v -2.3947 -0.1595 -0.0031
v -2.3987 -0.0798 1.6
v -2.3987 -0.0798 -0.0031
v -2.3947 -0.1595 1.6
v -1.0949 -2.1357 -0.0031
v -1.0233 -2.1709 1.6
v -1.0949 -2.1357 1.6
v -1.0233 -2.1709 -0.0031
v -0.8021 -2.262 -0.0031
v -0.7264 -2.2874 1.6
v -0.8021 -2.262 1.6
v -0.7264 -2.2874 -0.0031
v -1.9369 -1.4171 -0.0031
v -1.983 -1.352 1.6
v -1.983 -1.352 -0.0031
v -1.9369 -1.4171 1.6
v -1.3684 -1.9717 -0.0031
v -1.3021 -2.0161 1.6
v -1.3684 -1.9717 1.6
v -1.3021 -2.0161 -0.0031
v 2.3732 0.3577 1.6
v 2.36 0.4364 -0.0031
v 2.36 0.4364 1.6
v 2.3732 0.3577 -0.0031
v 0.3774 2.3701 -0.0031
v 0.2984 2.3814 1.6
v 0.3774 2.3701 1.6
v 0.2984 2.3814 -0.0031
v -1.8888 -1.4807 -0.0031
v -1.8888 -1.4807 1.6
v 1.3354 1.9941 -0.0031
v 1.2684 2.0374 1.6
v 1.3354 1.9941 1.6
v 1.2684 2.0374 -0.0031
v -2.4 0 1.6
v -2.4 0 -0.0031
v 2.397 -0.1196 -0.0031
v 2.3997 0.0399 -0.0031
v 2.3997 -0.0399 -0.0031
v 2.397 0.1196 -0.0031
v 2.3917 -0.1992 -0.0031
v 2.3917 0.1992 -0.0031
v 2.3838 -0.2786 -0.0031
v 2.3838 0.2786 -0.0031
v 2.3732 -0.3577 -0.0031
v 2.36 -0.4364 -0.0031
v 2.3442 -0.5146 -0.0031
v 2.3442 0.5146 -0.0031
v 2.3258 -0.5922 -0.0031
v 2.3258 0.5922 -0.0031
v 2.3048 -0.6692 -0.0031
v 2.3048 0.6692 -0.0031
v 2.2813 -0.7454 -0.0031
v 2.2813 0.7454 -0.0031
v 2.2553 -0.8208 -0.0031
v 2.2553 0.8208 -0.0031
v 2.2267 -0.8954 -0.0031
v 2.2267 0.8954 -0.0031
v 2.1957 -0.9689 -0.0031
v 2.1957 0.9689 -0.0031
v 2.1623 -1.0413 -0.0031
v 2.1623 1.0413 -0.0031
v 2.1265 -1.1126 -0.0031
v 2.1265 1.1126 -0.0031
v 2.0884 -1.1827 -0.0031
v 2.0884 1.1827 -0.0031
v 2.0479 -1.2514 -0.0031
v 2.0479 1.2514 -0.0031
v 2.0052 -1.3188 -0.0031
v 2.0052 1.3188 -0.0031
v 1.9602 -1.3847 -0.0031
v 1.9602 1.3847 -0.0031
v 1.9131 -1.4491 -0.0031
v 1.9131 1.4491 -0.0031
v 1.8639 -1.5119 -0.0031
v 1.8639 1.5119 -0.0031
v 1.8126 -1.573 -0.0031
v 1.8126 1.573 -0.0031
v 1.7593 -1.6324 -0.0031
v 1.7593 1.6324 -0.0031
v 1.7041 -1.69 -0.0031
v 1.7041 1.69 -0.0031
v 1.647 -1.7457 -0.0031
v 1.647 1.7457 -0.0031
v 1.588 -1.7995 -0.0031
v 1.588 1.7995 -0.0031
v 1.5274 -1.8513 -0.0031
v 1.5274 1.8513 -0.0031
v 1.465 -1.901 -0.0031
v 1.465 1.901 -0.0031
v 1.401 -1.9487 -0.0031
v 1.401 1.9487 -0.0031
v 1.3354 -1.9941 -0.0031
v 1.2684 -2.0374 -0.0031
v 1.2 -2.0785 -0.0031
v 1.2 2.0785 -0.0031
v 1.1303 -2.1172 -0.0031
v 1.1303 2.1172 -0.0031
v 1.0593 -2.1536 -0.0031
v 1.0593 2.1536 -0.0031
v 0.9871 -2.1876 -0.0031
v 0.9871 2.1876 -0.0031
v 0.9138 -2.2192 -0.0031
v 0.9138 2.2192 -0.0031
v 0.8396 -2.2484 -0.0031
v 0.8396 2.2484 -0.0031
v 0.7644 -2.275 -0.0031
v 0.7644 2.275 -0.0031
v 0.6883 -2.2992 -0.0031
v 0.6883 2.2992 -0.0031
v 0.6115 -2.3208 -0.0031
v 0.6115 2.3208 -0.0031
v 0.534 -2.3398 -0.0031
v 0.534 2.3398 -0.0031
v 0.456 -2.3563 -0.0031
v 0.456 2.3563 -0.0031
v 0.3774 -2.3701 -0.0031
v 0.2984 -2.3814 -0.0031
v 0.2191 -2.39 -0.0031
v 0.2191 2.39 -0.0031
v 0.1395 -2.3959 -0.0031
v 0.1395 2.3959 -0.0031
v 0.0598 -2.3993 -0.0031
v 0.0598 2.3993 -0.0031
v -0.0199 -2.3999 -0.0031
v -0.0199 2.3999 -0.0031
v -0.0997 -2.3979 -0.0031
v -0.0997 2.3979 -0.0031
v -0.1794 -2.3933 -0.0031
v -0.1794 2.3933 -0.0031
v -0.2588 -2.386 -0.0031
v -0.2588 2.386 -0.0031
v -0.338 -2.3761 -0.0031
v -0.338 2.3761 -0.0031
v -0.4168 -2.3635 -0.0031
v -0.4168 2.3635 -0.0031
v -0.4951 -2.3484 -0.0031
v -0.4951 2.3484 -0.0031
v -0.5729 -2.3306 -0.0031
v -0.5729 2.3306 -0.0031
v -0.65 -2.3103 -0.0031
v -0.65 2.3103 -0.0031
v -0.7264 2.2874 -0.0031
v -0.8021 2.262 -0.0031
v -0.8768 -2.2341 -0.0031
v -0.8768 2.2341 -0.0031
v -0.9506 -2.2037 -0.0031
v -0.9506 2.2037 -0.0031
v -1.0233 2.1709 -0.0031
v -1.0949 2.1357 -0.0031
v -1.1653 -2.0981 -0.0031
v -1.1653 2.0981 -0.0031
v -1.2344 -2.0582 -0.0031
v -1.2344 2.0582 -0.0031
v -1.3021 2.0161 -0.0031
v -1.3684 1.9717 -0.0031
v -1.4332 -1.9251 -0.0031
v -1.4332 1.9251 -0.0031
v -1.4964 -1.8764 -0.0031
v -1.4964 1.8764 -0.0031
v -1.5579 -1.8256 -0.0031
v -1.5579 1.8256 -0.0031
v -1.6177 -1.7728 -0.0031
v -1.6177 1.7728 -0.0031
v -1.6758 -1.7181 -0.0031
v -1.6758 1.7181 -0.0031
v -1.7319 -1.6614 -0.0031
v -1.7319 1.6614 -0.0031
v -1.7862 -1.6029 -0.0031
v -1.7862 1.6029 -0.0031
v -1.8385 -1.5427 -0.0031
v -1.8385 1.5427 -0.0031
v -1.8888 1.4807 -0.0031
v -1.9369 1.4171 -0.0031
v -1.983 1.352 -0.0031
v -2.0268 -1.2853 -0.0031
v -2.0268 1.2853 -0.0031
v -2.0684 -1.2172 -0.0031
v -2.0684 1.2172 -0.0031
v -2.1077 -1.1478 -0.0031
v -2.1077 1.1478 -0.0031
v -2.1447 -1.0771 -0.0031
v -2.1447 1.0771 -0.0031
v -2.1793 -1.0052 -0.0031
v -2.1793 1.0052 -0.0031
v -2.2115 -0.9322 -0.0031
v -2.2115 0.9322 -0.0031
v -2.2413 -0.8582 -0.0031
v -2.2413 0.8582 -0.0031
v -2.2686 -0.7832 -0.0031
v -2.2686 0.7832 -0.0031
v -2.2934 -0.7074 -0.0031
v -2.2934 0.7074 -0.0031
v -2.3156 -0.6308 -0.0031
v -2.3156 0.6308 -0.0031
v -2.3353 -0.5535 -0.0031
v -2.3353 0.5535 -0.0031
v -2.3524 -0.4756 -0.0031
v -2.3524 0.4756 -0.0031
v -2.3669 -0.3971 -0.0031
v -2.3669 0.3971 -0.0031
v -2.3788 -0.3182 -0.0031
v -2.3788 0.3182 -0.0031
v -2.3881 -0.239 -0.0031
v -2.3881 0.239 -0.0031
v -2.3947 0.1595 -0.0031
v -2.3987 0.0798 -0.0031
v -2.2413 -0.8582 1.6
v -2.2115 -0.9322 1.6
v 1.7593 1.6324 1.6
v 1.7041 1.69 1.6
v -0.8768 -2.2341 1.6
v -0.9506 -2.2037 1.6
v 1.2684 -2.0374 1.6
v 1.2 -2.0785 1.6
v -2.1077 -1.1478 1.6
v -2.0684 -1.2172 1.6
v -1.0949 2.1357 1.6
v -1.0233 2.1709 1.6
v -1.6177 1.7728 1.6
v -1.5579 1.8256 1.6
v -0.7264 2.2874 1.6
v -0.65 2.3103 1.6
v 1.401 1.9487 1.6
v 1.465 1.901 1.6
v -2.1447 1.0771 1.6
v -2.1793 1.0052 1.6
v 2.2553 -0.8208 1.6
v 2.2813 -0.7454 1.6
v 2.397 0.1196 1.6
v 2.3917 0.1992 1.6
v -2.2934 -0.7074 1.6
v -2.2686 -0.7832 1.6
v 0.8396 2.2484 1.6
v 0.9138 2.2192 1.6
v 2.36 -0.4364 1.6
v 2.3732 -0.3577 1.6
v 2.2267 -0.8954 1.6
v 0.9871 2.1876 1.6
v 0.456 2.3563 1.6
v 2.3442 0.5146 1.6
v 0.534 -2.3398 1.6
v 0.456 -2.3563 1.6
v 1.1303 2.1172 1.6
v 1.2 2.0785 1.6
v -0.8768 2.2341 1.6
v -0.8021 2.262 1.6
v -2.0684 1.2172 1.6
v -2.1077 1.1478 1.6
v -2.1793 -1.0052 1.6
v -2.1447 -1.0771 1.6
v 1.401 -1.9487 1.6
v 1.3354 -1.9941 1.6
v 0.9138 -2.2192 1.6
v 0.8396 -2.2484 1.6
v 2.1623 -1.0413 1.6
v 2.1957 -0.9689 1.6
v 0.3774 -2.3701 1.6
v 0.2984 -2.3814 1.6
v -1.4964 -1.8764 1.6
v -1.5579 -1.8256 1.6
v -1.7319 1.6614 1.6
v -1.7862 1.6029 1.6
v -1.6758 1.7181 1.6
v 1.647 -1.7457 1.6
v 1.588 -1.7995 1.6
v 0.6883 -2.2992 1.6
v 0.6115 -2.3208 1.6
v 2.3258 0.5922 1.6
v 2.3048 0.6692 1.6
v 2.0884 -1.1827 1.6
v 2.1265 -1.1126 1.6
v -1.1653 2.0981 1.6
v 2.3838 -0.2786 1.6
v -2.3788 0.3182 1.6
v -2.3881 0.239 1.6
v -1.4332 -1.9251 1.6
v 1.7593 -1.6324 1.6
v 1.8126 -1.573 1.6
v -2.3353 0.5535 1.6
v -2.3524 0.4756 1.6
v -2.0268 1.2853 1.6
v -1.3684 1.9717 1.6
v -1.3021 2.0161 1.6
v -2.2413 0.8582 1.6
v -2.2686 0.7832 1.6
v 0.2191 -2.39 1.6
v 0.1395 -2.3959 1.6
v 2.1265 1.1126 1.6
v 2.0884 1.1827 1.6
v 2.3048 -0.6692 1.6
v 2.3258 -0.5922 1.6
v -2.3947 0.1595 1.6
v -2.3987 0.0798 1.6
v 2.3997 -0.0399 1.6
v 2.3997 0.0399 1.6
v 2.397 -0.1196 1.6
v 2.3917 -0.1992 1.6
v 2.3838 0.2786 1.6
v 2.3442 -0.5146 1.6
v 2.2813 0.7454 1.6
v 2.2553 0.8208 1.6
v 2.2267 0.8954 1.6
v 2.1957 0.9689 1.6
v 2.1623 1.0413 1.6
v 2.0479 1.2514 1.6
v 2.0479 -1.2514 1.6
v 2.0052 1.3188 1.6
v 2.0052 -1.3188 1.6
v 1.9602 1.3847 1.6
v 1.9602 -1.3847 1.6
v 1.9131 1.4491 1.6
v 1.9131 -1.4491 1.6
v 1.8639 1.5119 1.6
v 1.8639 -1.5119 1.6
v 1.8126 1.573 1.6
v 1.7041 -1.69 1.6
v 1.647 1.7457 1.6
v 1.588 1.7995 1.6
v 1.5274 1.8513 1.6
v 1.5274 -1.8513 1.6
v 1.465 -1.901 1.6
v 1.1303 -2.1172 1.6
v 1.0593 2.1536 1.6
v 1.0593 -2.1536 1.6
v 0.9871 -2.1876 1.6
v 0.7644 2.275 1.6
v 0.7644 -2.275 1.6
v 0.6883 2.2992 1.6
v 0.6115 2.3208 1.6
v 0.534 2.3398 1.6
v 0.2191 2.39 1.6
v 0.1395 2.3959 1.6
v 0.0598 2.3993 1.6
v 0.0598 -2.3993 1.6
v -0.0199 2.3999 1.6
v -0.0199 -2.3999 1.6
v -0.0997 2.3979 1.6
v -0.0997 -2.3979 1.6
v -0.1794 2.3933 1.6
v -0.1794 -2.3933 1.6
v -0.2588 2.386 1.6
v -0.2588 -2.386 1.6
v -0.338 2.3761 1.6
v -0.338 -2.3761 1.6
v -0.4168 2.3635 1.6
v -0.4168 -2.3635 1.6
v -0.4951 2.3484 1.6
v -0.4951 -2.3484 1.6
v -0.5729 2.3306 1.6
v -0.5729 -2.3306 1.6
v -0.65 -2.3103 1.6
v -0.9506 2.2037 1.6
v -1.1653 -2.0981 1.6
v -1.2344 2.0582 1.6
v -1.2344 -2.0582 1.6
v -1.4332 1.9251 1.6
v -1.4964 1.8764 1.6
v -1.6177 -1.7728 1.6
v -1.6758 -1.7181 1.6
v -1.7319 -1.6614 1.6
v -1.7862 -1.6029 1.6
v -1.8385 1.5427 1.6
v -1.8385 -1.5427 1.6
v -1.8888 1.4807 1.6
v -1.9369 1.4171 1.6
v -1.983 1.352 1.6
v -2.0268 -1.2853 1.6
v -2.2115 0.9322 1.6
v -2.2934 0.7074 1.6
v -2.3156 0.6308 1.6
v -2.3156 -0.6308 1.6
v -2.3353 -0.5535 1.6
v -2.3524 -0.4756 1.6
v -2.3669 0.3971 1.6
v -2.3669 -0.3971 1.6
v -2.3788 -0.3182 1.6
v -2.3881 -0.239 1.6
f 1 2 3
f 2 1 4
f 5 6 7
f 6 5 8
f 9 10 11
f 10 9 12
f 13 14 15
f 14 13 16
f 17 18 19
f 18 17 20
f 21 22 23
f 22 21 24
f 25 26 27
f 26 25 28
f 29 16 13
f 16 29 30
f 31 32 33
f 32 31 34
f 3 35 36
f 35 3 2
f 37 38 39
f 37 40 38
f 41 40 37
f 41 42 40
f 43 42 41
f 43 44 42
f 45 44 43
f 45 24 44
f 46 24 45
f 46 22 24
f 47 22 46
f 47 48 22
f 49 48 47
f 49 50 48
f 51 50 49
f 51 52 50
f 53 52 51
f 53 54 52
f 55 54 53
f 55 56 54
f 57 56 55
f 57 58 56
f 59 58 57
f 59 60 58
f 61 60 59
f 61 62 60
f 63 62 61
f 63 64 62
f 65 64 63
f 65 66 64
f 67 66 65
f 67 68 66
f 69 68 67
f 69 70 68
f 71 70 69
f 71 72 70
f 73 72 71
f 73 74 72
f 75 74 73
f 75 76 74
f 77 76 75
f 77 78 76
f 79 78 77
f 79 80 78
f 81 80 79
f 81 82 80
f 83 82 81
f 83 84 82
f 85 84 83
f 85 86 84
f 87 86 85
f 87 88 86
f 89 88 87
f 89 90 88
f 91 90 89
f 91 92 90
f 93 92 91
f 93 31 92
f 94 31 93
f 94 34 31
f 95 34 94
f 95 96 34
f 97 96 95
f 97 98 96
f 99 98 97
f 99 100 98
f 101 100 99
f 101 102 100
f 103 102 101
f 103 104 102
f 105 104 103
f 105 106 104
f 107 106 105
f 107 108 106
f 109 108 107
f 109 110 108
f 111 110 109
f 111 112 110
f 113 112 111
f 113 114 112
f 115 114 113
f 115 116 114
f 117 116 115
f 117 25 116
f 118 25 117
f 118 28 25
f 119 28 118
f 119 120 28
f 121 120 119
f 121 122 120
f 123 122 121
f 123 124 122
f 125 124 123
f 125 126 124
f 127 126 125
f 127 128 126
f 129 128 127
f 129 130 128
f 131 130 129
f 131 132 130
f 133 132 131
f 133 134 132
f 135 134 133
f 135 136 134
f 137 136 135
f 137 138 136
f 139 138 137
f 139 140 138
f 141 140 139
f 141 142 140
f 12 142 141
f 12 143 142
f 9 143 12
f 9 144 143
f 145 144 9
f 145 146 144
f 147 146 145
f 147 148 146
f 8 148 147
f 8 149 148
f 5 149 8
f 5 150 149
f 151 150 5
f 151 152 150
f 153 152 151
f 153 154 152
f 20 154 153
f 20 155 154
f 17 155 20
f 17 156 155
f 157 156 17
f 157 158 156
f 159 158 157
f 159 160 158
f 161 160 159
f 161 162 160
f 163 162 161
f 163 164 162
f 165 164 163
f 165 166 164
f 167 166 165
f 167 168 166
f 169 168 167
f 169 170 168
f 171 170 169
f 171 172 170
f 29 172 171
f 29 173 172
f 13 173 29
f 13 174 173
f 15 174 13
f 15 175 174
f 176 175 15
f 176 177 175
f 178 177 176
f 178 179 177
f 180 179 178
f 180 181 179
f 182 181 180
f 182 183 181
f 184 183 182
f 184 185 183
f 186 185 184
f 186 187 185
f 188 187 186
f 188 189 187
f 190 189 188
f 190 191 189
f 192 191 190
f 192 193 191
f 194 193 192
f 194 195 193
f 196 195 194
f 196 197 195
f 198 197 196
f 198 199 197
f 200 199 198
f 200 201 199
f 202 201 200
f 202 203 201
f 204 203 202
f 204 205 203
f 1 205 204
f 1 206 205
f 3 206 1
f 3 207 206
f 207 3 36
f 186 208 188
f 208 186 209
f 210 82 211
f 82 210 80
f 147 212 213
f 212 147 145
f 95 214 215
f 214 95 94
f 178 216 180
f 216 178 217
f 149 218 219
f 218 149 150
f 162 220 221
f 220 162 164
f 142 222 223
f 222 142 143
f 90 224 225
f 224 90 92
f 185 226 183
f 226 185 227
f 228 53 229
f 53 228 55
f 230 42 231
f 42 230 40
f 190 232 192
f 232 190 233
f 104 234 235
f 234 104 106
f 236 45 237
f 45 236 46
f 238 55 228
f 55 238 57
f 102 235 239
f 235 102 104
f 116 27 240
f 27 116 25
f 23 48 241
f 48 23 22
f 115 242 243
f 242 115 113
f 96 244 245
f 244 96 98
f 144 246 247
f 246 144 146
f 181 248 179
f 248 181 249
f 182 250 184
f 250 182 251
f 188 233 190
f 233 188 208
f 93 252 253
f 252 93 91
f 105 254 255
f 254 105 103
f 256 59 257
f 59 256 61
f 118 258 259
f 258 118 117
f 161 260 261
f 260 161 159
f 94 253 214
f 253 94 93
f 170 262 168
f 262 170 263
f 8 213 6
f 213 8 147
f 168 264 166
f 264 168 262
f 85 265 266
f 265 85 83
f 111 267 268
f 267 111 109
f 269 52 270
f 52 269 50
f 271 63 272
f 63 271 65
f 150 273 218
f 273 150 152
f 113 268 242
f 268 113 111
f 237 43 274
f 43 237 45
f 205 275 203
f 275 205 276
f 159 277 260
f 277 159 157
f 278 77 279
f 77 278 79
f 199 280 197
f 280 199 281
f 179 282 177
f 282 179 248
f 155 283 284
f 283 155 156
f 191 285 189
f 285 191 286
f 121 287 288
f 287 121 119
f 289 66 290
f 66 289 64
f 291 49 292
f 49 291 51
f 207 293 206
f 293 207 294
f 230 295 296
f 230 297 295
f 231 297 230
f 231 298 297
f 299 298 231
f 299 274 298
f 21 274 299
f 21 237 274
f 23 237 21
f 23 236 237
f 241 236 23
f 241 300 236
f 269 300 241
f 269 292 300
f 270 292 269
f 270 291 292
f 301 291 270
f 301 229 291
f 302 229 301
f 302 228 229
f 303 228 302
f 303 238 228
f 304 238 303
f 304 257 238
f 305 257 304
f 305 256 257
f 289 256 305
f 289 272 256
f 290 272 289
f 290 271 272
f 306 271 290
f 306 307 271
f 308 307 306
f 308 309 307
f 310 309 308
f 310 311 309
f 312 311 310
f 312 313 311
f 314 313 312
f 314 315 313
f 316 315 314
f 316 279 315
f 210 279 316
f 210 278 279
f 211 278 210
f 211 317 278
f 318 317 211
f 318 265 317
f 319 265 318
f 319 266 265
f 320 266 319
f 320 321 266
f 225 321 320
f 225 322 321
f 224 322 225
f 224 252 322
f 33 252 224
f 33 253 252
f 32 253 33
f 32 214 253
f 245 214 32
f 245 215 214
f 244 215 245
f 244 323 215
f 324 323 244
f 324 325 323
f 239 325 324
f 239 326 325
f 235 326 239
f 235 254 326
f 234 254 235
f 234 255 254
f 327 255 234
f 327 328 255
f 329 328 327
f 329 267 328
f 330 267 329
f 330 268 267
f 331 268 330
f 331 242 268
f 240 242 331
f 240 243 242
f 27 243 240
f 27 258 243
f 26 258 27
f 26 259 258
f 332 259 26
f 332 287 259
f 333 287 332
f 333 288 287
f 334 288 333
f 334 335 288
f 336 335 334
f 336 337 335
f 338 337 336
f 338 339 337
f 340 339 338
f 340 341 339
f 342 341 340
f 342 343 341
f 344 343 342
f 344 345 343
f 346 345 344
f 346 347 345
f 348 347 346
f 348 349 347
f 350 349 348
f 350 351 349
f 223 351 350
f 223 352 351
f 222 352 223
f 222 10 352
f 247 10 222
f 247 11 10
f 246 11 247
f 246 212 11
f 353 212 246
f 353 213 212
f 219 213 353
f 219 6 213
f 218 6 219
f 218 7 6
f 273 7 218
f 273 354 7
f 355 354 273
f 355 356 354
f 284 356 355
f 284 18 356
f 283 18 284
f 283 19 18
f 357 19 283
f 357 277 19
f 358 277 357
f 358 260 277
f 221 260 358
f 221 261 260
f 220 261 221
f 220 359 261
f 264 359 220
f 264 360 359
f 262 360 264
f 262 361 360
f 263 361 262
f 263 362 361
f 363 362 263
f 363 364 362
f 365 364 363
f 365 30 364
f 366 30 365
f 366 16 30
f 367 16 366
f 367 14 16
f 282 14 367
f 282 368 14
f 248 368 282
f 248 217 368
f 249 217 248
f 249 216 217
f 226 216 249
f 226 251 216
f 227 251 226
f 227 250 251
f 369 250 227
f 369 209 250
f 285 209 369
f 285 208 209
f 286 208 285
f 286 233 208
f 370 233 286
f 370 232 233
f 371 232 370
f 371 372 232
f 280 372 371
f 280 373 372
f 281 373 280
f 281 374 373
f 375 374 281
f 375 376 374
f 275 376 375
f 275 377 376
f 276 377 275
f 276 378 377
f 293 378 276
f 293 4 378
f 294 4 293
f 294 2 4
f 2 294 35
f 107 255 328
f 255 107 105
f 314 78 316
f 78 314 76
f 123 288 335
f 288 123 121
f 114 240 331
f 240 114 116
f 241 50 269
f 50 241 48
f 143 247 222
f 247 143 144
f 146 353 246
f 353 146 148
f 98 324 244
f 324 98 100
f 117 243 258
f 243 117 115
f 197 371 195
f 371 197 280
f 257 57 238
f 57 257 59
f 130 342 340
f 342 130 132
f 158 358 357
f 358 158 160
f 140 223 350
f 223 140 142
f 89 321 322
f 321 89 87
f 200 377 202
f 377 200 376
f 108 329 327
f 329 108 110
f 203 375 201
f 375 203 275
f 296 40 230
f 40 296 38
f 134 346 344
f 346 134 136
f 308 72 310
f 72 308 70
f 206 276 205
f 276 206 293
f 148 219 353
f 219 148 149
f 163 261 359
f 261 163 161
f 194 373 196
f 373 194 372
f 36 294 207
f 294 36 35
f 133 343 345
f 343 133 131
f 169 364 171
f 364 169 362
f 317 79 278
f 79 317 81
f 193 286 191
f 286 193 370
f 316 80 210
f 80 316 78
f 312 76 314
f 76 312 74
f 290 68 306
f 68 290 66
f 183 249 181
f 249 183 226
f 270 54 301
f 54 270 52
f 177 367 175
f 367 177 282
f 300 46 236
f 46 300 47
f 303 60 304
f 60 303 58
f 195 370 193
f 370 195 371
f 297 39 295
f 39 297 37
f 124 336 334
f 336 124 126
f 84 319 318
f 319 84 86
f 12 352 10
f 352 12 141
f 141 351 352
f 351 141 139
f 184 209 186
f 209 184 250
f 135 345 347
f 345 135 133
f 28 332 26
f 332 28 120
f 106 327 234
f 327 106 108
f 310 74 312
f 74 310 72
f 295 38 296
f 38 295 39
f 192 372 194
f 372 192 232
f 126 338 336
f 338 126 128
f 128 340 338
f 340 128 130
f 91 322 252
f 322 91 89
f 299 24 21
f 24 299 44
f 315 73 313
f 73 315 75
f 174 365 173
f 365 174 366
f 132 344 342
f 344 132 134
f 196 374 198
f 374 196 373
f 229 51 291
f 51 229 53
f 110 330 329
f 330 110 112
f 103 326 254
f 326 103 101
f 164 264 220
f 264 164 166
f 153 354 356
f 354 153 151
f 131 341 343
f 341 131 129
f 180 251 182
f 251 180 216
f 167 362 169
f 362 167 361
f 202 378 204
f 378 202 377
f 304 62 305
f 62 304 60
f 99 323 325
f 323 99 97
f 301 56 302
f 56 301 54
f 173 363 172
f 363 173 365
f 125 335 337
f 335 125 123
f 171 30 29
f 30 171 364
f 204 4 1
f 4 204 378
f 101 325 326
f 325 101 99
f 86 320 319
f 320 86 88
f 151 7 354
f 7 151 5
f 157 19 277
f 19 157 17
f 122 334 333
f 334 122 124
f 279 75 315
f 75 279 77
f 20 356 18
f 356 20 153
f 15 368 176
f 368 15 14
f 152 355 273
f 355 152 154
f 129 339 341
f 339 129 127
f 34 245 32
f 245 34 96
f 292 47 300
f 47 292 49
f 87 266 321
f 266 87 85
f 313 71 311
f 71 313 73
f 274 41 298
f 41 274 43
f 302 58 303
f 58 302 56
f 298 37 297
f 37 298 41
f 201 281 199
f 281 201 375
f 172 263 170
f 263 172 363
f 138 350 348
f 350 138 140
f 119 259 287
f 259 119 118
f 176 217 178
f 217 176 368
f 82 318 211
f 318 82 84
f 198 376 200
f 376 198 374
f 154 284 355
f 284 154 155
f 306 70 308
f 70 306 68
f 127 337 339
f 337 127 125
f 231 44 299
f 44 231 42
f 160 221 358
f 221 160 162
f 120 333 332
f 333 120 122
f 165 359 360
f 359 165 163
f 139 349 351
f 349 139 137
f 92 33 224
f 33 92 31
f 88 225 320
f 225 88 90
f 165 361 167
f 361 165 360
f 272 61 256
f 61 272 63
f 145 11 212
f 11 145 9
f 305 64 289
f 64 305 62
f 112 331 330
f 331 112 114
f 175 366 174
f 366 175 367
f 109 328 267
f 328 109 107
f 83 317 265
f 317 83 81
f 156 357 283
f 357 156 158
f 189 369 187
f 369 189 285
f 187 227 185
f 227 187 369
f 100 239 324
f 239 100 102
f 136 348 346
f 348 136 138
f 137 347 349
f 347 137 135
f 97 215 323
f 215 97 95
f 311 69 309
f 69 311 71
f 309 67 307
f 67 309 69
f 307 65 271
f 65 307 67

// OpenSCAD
use <../lib.scad>
use <3005pv6.scad>
$fa=1; $fs=0.2;
function ldraw_lib__3005_6b(realsolid=false) = [
// 0 ~Moved to 3005pv6
// 0 Name: 3005-6b.dat
// 0 Author: [PTadmin]
// 0 !LDRAW_ORG Part UPDATE 2004-02
// 0 !LICENSE Licensed under CC BY 4.0 : see CAreadme.txt
// 
// 0 BFC CERTIFY CCW
  [0,"BFC","CERTIFY"],
  [0,"BFC","CCW"],
// 
// 0 !HISTORY 1998-12-15 [PTadmin] Official Update 1998-10
// 0 !HISTORY 2004-04-22 [PTadmin] Official Update 2004-02
// 0 !HISTORY 2007-05-11 [PTadmin] Header formatted for Contributor Agreement
// 0 !HISTORY 2008-07-01 [PTadmin] Official Update 2008-01
// 
// 
// 1 16 0 0 0 1 0 0 0 1 0 0 0 1 3005pv6.dat
  [1,16,0,0,0,1,0,0,0,1,0,0,0,1, ldraw_lib__3005pv6(realsolid)],
];
module ldraw_lib__3005_6b(step=0, col=false, unit=2/5, alt=false, line=0.2, solid=!$preview)
    makepoly(ldraw_lib__3005_6b(solid), step=step, col=col, unit=unit, alt=alt, line=line, solid=solid);
ldraw_lib__3005_6b(line=0.2);
